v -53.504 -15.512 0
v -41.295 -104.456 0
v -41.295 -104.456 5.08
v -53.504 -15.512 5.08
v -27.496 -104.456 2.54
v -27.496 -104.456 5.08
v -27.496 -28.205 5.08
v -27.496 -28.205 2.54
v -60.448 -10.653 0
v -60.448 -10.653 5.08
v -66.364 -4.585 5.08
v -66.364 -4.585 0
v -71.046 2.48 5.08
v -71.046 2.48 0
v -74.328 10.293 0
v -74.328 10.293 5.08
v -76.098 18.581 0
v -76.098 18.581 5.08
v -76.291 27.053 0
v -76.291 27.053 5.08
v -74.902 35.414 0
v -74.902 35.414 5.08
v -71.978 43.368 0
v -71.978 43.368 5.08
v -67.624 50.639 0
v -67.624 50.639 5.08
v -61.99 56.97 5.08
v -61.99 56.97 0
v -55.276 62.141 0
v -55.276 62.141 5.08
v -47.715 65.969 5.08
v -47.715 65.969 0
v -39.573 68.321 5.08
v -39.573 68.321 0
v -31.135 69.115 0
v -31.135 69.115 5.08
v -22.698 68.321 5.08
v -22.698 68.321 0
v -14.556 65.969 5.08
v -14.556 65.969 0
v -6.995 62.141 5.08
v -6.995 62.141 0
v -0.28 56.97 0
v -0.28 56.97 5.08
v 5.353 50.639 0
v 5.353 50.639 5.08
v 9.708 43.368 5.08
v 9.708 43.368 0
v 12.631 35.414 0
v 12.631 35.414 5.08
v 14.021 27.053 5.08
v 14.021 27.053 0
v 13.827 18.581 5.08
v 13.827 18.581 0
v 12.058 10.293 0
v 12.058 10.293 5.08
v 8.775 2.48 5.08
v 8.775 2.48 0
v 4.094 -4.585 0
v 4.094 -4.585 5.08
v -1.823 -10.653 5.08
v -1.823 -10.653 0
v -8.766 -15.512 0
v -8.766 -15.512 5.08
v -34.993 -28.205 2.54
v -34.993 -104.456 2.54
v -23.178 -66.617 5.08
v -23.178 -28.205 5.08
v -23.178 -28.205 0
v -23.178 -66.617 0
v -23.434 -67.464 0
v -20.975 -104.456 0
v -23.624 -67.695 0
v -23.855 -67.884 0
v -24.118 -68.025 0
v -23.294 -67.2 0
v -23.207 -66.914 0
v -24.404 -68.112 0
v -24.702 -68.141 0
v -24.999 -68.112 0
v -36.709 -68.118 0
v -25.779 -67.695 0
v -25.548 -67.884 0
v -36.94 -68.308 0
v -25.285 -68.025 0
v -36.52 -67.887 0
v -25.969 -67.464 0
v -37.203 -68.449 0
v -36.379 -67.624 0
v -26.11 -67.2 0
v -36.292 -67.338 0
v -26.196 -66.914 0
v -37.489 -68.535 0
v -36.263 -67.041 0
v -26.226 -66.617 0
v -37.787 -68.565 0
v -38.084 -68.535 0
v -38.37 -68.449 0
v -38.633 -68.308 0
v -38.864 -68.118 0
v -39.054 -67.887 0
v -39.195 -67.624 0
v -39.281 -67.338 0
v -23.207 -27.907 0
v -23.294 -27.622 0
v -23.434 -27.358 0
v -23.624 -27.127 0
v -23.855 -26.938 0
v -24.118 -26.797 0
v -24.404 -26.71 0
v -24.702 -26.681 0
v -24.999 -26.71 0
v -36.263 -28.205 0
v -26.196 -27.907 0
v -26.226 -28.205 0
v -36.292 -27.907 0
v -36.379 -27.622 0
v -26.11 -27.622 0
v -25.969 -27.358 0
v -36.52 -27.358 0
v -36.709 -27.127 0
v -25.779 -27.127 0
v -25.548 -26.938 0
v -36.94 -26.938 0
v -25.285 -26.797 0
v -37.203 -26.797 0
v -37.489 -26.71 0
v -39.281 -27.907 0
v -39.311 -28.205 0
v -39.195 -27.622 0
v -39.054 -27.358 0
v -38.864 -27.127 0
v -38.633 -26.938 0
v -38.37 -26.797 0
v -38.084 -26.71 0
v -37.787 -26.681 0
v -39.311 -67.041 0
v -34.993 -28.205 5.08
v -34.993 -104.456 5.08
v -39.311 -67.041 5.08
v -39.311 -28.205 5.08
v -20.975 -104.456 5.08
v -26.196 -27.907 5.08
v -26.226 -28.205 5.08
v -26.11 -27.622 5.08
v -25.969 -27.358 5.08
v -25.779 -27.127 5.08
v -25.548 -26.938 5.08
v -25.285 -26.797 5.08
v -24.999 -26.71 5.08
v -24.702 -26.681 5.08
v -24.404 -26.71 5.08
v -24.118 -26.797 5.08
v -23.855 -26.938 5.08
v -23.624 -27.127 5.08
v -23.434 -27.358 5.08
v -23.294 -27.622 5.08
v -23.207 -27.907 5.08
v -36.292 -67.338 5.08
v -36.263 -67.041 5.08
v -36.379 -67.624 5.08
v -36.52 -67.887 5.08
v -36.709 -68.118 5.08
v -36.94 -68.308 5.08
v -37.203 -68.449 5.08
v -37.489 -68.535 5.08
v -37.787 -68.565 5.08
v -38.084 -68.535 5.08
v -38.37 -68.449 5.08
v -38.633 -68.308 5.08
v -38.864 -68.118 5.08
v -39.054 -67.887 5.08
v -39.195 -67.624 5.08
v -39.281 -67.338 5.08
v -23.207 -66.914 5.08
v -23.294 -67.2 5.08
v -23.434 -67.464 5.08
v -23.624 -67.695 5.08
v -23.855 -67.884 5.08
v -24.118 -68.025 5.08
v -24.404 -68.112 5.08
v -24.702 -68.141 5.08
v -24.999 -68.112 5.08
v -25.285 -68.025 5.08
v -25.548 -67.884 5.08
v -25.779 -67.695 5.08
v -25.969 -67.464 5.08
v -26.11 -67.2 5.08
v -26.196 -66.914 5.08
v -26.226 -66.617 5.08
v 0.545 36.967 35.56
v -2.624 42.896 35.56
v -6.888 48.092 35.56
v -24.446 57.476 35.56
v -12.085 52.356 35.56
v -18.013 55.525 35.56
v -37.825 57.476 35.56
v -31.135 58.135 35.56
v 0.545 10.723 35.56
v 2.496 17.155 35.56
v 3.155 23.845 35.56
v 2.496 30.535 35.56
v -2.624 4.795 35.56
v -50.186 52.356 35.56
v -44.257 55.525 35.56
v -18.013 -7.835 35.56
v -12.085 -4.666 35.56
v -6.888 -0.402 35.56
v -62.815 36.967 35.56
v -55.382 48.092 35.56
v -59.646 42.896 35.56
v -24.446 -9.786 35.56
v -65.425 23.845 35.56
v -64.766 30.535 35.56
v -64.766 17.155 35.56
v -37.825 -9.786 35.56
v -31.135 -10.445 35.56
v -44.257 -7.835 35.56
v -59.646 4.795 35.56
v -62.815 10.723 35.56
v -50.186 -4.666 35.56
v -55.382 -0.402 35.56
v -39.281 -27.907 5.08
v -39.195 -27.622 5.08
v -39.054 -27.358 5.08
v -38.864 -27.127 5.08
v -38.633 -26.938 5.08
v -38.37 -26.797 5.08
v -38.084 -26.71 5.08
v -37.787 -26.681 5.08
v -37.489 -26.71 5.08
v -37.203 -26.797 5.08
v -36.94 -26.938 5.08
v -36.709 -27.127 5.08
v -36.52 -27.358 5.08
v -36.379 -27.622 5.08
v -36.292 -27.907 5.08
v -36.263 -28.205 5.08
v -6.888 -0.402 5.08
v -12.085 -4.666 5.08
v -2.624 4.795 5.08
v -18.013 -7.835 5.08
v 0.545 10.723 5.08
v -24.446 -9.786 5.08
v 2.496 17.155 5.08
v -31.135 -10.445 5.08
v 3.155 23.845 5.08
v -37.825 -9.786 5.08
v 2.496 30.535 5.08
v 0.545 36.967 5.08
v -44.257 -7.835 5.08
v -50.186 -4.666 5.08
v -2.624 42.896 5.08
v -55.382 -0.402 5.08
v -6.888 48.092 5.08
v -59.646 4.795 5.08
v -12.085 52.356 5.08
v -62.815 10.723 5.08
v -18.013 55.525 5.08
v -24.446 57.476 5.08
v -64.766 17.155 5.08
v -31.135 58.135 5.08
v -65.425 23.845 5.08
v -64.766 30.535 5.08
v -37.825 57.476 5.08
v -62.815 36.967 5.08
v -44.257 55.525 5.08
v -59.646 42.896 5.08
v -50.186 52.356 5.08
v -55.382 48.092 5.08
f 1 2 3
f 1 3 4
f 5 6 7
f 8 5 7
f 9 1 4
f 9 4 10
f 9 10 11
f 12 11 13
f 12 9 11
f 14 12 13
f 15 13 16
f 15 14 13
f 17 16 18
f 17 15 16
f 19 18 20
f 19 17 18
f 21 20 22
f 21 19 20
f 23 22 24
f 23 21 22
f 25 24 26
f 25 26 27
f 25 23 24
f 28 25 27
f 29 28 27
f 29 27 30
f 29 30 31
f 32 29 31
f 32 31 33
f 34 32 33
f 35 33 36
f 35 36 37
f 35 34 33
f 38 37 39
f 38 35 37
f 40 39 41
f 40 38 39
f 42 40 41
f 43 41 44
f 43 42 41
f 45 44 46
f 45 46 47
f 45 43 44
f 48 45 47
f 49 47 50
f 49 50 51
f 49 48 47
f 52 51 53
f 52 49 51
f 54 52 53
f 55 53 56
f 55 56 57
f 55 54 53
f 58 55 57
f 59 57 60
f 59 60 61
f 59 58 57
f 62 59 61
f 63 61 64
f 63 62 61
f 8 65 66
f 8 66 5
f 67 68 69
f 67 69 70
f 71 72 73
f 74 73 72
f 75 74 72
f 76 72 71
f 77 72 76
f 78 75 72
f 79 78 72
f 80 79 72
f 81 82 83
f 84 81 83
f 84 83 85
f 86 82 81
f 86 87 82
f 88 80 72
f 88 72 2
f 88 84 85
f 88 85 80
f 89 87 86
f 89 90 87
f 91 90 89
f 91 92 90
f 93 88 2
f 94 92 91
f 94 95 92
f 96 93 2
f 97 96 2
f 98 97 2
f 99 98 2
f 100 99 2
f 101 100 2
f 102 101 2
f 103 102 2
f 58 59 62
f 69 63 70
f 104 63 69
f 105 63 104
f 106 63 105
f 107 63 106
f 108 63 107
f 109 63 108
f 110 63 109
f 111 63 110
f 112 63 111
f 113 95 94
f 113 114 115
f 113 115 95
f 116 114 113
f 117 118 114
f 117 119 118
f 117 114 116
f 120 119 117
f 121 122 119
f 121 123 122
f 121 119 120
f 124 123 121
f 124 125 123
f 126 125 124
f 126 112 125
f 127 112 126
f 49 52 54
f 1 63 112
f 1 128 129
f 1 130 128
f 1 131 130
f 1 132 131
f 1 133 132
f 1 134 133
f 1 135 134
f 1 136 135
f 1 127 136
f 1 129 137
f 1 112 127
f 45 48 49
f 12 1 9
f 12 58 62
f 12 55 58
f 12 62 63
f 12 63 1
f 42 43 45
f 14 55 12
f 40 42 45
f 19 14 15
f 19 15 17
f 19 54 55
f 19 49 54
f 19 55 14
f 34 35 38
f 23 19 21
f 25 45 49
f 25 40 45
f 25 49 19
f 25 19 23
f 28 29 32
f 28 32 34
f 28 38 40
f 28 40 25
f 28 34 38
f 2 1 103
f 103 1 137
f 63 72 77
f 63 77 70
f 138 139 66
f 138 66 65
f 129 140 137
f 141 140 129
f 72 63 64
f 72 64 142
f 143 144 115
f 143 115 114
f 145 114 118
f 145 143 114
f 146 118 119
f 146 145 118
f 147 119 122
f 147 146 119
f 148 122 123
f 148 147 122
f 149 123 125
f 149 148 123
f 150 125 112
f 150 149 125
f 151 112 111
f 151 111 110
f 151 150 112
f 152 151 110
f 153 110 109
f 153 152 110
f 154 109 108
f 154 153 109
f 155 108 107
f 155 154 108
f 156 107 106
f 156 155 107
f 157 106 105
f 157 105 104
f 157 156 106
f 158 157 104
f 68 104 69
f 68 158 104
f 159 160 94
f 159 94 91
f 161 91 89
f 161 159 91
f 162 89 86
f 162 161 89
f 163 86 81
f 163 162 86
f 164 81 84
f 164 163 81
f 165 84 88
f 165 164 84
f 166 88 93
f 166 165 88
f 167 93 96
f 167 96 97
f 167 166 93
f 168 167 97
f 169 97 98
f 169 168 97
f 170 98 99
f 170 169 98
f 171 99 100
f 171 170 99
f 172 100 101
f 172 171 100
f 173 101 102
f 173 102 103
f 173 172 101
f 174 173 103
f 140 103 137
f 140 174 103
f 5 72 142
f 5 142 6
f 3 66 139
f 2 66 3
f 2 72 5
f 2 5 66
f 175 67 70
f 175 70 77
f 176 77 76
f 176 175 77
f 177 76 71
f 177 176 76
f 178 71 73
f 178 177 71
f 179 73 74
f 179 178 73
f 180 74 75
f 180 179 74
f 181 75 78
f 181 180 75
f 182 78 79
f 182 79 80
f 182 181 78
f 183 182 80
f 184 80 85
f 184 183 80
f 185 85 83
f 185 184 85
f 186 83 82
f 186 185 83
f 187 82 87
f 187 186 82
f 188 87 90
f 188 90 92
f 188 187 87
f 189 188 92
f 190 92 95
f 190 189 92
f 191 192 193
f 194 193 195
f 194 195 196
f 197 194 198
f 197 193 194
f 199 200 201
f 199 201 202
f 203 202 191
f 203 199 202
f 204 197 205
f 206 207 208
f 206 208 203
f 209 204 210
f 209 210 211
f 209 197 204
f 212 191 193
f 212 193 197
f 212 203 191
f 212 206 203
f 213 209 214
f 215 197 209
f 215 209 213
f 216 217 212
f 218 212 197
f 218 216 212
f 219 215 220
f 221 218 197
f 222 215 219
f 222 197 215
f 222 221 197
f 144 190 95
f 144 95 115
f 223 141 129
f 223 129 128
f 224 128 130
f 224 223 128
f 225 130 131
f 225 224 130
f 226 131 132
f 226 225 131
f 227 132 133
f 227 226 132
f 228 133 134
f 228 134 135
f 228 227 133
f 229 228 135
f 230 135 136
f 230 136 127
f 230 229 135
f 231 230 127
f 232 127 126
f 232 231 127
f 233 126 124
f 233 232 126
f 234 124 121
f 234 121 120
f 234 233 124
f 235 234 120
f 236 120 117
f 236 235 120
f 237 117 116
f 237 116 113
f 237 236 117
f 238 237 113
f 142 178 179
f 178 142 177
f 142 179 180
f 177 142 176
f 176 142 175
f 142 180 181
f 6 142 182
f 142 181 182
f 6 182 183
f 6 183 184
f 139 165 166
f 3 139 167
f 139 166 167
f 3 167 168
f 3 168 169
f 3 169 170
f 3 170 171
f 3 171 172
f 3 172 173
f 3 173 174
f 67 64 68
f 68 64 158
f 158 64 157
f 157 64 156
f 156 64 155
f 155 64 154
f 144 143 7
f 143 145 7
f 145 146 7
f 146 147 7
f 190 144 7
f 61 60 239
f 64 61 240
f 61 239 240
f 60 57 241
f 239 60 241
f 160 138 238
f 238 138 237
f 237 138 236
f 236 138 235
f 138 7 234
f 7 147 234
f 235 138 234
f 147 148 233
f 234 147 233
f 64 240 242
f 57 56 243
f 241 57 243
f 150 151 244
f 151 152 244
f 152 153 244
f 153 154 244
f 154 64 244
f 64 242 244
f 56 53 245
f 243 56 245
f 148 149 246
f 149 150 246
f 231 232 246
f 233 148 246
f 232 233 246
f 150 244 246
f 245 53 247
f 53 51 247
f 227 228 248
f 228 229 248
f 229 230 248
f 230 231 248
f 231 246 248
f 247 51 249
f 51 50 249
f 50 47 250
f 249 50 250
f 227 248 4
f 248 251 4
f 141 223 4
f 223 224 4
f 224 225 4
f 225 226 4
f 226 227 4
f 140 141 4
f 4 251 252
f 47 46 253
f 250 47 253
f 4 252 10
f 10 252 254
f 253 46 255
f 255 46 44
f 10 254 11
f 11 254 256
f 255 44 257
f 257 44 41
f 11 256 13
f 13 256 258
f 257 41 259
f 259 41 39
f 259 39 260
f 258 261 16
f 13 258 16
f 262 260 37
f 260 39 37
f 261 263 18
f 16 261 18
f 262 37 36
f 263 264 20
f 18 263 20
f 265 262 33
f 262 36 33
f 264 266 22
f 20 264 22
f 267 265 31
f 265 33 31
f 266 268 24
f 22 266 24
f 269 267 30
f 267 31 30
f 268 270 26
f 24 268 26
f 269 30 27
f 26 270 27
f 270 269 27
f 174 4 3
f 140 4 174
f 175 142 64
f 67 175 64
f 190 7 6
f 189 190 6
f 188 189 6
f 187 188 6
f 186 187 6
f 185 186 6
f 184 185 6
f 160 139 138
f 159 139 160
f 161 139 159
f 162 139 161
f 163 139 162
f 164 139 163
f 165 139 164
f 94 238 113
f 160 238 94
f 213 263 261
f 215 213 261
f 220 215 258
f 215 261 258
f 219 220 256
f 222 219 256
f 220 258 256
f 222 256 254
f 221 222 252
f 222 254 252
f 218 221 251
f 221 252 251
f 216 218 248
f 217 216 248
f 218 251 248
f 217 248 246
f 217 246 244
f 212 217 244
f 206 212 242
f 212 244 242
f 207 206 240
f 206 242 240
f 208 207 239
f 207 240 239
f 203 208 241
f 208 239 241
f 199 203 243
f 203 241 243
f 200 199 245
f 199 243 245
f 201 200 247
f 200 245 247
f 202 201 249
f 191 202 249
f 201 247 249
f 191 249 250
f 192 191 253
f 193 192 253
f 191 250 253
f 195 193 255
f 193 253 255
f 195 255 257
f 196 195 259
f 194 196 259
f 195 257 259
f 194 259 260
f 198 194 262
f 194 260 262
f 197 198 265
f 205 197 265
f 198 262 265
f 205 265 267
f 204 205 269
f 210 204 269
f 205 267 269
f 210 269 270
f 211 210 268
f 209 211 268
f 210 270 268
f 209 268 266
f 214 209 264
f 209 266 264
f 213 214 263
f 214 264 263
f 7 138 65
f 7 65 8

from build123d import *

# Parameters (mm, degrees)
BOSS_EXTRUDE1_DEPTH = 5.08
SKETCH4_W           = 7.497155508
SKETCH4_H           = 76.250815091
CUT_EXTRUDE3_DEPTH  = 2.54
CUT_EXTRUDE4_DEPTH  = 5.08
SKETCH11_R          = 34.29
BOSS_EXTRUDE3_DEPTH = 30.48


with BuildPart() as part:
    # Sketch1 → Boss-Extrude1 (new body)
    with BuildSketch(Plane.XY):
        with BuildLine():
            Line((-26.055152411, -104.455615698), (-36.215152411, -104.455615698))
            Line((-36.215152411, -104.455615698), (-41.295152411, -104.455615698))
            Line((-41.295152411, -104.455615698), (-53.504081842, -15.511778924))
            ThreePointArc((-53.504081842, -15.511778924), (-31.135152411, 69.114610814), (-8.76622298, -15.511778924))
            Line((-8.76622298, -15.511778924), (-20.975152411, -104.455615698))
            Line((-20.975152411, -104.455615698), (-26.055152411, -104.455615698))
        make_face()
    extrude(amount=BOSS_EXTRUDE1_DEPTH)

    # Sketch4 → Cut-Extrude3 (cut)
    with BuildSketch(Plane.XY.offset(5.08)):
        with Locations((-31.244121472, -66.330208153)):
            Rectangle(SKETCH4_W, SKETCH4_H)
    extrude(amount=-CUT_EXTRUDE3_DEPTH, mode=Mode.SUBTRACT)

    # Sketch5 → Cut-Extrude4 (cut)
    with BuildSketch(Plane.XY.offset(5.08)):
        with BuildLine():
            Line((-36.262699226, -28.204800607), (-36.262699226, -67.040609222))
            ThreePointArc((-36.262699226, -67.040609222), (-37.786699226, -68.564609222), (-39.310699226, -67.040609222))
            Line((-39.310699226, -67.040609222), (-39.310699226, -28.204800607))
            ThreePointArc((-39.310699226, -28.204800607), (-37.786699226, -26.680800607), (-36.262699226, -28.204800607))
        make_face()
        with BuildLine():
            Line((-23.177543718, -28.204800607), (-23.177543718, -66.616952793))
            ThreePointArc((-23.177543718, -66.616952793), (-24.701543718, -68.140952793), (-26.225543718, -66.616952793))
            Line((-26.225543718, -66.616952793), (-26.225543718, -28.204800607))
            ThreePointArc((-26.225543718, -28.204800607), (-24.701543718, -26.680800607), (-23.177543718, -28.204800607))
        make_face()
    extrude(amount=-CUT_EXTRUDE4_DEPTH, mode=Mode.SUBTRACT)

    # Sketch11 → Boss-Extrude3 (add)
    with BuildSketch(Plane.XY.offset(5.08)):
        with Locations(Location((-31.135152411, 23.845074516, 0), (0, 0, 180))):
            Circle(SKETCH11_R)
    extrude(amount=BOSS_EXTRUDE3_DEPTH)


solid = part.part
